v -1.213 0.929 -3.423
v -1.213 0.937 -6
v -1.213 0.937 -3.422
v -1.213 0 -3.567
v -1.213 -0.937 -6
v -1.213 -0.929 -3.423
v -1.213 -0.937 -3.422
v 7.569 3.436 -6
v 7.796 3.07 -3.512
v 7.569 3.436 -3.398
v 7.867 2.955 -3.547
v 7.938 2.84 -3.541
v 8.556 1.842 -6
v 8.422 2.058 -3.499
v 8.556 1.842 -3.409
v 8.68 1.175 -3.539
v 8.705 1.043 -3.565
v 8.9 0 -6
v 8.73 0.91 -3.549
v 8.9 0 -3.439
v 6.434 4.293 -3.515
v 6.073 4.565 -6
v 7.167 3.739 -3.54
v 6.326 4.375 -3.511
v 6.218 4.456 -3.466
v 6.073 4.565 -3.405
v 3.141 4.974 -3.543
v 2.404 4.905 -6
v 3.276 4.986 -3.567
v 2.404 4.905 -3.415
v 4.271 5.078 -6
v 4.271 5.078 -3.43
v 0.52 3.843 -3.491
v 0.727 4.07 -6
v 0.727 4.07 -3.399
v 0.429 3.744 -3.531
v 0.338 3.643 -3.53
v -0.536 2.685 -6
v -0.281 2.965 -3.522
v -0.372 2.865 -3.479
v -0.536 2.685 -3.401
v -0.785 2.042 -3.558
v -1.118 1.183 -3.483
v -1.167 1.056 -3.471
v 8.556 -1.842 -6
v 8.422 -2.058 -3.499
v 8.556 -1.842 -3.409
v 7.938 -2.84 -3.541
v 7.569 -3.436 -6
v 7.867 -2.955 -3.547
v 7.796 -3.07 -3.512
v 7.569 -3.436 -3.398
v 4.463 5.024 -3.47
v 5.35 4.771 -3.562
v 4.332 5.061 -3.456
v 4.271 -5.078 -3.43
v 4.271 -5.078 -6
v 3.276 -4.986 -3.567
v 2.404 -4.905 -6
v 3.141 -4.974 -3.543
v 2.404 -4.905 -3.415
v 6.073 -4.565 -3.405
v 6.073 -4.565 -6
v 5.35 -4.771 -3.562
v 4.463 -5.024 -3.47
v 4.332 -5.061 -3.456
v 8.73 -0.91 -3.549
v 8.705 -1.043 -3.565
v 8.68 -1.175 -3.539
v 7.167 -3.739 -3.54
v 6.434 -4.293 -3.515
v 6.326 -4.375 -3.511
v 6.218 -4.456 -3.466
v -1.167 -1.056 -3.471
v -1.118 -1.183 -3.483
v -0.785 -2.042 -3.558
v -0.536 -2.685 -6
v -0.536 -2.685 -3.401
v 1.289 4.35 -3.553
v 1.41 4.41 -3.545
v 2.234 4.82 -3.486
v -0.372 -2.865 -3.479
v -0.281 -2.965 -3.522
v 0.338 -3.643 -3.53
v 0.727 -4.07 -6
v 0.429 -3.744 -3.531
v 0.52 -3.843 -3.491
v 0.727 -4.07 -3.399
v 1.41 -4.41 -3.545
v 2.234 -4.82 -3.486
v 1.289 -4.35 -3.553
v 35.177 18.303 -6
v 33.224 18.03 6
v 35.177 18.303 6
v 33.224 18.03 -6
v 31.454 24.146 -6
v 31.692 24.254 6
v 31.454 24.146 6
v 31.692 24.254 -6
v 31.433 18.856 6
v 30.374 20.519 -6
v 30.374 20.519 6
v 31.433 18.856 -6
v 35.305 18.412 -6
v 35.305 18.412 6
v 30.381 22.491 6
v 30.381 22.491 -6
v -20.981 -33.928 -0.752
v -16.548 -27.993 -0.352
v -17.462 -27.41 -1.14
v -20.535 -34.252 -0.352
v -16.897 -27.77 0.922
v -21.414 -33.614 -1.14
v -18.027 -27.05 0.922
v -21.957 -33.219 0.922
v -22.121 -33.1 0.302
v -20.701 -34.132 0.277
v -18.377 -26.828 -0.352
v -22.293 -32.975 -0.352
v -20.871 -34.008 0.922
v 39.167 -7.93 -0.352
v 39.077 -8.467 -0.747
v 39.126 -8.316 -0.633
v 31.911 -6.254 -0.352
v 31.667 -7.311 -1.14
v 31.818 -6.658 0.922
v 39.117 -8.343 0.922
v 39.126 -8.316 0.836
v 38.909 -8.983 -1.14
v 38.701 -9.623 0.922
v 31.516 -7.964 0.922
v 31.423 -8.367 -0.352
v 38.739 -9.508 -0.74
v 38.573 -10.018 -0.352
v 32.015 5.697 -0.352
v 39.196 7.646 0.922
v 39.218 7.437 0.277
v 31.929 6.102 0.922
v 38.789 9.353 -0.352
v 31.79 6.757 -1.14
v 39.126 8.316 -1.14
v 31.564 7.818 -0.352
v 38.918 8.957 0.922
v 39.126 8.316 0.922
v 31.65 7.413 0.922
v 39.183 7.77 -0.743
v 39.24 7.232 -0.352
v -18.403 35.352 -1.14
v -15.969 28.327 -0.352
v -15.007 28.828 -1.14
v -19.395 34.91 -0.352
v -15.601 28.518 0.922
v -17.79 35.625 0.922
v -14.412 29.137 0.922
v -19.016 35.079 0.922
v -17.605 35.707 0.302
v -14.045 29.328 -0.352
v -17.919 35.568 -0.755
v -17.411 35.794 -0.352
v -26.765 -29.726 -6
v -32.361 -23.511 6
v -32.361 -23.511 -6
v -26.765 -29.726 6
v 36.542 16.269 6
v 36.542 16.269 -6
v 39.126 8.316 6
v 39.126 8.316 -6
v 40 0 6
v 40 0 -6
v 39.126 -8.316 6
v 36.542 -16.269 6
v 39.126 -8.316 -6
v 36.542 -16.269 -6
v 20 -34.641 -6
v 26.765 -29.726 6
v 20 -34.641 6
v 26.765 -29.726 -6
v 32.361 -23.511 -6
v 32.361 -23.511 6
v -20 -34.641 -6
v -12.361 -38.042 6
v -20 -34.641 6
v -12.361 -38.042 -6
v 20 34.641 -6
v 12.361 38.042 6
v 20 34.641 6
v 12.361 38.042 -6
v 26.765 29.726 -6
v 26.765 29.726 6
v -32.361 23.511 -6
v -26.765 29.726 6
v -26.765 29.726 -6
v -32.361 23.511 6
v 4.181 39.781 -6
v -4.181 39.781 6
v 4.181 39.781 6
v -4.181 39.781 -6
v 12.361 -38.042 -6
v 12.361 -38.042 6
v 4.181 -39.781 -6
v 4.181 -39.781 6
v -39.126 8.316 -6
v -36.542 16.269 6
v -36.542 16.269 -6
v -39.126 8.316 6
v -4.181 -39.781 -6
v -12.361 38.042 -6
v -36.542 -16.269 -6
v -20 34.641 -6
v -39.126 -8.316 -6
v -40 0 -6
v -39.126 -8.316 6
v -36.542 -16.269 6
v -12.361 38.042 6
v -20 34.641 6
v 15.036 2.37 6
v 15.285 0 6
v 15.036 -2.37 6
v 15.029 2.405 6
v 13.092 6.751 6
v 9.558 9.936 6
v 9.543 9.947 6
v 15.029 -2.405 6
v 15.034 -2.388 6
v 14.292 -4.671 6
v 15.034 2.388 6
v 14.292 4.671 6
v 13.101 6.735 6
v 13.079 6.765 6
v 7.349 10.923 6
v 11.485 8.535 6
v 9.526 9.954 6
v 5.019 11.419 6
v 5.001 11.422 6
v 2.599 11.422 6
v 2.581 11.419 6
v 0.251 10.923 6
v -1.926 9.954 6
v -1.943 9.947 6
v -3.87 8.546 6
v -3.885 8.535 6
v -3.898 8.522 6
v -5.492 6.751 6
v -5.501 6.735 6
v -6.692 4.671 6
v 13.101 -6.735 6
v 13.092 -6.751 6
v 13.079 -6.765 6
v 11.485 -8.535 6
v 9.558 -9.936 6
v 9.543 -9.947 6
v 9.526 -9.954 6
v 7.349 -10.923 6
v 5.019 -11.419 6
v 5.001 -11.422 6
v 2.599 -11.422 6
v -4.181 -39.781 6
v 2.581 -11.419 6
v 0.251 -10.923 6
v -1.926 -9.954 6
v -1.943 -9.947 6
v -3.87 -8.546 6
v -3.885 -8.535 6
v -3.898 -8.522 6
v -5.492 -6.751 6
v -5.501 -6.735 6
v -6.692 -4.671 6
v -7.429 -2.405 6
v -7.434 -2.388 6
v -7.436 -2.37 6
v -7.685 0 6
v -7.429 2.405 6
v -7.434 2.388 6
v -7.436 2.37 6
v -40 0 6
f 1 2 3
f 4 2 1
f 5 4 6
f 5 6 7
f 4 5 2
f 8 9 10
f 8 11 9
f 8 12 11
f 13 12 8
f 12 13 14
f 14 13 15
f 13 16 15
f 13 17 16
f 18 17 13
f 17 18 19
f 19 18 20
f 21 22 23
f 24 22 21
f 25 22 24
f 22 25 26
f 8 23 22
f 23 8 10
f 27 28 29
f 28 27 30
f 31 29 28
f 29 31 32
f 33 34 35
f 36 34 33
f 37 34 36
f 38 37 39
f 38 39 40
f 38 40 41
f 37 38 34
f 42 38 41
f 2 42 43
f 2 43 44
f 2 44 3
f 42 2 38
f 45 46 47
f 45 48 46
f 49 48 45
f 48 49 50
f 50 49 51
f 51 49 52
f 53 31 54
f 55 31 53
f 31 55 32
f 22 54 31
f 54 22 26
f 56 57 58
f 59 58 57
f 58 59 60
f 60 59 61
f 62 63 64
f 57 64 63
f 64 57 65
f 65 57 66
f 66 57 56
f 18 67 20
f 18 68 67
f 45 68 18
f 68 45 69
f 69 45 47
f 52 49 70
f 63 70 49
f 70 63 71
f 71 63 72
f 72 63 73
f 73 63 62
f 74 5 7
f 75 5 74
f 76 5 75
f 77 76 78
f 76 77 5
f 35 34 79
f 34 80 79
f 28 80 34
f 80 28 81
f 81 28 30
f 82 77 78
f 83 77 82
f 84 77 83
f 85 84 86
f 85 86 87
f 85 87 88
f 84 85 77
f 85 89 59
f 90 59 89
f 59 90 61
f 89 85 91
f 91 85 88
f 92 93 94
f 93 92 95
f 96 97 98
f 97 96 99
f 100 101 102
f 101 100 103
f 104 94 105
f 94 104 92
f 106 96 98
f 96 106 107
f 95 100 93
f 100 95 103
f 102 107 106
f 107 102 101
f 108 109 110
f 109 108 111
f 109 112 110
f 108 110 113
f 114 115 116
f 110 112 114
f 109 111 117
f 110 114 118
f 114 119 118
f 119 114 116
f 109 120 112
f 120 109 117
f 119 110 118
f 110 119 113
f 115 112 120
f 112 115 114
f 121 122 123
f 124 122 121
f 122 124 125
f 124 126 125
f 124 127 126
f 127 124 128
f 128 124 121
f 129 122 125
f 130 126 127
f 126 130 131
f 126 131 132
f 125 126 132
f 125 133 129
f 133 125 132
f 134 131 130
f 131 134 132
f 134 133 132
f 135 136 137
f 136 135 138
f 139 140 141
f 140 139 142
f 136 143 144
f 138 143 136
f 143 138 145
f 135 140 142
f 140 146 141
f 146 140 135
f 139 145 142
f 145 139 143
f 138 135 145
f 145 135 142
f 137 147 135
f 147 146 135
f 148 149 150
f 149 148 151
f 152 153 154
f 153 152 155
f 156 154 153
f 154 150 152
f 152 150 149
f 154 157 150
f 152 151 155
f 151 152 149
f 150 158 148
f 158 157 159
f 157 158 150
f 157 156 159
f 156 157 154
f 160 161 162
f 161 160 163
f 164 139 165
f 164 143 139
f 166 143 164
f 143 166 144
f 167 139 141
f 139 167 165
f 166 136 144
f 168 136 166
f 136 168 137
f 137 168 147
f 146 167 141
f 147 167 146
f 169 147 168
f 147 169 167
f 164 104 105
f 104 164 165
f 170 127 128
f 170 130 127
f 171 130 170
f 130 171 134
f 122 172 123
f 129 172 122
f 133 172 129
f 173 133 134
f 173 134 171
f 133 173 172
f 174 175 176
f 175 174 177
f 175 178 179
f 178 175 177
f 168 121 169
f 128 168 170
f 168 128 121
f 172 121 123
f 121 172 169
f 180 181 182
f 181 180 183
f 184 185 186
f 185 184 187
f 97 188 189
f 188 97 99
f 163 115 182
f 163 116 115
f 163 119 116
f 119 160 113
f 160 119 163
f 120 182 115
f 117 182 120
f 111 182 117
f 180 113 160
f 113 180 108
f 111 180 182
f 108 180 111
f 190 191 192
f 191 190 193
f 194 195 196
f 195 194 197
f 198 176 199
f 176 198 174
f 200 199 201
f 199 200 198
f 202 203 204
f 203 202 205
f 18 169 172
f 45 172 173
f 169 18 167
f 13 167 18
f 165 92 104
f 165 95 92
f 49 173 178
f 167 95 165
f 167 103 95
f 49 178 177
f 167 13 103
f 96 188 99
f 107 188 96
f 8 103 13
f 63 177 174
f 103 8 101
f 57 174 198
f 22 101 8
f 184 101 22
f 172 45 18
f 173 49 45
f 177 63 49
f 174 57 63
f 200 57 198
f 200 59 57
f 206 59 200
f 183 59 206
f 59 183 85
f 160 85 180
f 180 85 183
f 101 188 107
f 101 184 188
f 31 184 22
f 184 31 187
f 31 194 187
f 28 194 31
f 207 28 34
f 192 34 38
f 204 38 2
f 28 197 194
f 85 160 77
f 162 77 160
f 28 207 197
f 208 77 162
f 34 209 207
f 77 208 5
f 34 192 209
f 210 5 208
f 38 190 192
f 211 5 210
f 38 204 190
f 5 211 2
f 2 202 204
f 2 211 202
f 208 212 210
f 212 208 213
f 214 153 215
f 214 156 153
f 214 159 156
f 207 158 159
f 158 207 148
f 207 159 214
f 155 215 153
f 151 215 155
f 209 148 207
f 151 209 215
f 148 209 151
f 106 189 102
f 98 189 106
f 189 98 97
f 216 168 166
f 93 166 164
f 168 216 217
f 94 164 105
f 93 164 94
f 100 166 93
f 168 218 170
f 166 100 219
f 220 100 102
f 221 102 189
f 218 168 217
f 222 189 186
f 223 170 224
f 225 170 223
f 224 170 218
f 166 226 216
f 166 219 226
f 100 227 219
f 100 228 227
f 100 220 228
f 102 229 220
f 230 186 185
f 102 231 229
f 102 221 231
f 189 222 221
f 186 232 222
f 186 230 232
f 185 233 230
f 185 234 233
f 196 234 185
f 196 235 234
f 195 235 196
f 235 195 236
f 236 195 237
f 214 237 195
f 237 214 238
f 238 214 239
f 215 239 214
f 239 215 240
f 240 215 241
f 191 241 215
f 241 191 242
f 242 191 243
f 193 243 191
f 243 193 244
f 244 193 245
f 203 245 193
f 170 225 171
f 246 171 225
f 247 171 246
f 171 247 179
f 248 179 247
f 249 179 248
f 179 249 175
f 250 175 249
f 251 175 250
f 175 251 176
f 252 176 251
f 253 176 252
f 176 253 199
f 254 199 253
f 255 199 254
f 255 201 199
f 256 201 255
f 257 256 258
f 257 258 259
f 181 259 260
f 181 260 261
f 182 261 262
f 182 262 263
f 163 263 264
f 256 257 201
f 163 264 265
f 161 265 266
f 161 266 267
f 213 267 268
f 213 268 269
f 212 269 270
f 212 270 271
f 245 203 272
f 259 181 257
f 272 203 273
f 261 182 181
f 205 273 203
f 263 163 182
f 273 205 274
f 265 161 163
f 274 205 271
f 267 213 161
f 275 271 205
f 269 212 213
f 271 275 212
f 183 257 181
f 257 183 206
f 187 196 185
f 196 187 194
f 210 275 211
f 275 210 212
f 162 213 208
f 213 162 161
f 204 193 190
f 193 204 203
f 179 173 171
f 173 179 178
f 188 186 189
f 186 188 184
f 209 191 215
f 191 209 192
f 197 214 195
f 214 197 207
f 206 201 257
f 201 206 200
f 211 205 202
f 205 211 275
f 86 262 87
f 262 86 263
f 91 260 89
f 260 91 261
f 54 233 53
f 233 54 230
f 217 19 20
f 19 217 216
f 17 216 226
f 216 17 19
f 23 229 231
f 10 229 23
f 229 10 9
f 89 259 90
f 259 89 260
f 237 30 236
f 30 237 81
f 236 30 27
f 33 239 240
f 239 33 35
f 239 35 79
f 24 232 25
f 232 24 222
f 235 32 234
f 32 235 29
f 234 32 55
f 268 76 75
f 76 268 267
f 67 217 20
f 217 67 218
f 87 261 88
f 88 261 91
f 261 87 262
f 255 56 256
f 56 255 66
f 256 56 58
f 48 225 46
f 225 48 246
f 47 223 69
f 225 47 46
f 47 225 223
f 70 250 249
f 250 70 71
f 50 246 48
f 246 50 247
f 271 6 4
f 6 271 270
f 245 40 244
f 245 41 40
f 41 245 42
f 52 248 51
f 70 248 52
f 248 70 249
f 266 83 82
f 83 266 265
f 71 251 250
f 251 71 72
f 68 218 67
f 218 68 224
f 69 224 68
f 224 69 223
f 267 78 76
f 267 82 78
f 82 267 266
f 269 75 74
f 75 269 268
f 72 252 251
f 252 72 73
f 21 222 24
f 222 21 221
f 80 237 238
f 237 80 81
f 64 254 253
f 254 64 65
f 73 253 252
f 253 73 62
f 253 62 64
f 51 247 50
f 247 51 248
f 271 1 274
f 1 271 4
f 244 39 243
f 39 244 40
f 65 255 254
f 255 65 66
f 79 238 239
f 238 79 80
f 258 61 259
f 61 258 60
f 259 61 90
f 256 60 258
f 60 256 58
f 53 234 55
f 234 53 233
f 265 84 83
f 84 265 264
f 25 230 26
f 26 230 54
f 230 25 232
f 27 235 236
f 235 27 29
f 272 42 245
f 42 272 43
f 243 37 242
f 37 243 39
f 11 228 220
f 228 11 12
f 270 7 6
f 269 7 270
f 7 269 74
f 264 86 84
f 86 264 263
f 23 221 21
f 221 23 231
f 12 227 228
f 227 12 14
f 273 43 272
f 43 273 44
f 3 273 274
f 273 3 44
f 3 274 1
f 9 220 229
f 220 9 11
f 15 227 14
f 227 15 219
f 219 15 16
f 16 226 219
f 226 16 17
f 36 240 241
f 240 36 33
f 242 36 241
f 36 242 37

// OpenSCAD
// Base for Spider
// 12/14/2020
// Note: I had to break down the differences to make the file work in Freecad

scale=25.4;    // Inch to mm

//Main disk
dm=80; //External diameter mm
hm=12; //heigth  mm

//central hole
soffset=3.8; //Secondary offset
dh=10.2; //diameter hole

//cone
b=25;

//indent 
wi=2.28;
hi=15;

//rotation
r=-122.5; 
adjust=-.5;

//resolution
//$fn=150;

module indent(dm,hi,wi){
translate([(dm)/2,0,0]) rotate([0,90,0])cylinder(h=hi,d=wi, center=true);
    }
    
//module conicalhole(){
//    translate([soffset,0,0]) union(){
//            cylinder(h=hm*3, d=dh, center=true); //the hole
//            translate([0,0,-1]) cylinder(h=hm+5, r1=1,r2=b/2, center=true); 
//            }
//       }
//_________________________________________________________________________________
module mainbody(){
difference(){

    cylinder(h=hm, d=dm, center=true); //the disk
    
    union(){//the screw holes
    translate([soffset,0,0])cylinder(h=hm*3, d=dh, center=true); //the hole
    rotate([0,0,r+155]) translate([(dm)/2,0,0]) cylinder(h=hm+5,d=7, center=true);//the notch
    rotate([0,0,r+0])    indent(dm,hi,wi);
    rotate([0,0,r+110+adjust])  indent(dm,hi,wi);// closing screw 2
    rotate([0,0,r+135+adjust])  indent(dm,hi,wi);//closing scew 1
    rotate([0,0,r-120]) indent(dm,hi,wi);
    }
    
}
}

difference(){
    mainbody();
    translate([soffset,0,-1]) cylinder(h=hm+5, r1=1,r2=b/2, center=true); 
}


//_________________________________________________________________________________
//if(0){
//  color( "blue" ) {
//    //cylinder(h=hm+1, d1=0,d2=b, center=true); //the hole
//    rotate([0,0,150]) translate([(dm)/2,0,0]) cylinder(h=hm+5,d=7, center=true);
//   }
//}
//_________________________________________________________________________________
if(0){
  color( "blue" ) {
    translate([soffset,0,50]) union(){
            cylinder(h=hm*3, d=dh, center=true); //the hole
            translate([0,0,-1]) cylinder(h=hm+5, r1=1,r2=b/2, center=true); 
            }  
  }
}
